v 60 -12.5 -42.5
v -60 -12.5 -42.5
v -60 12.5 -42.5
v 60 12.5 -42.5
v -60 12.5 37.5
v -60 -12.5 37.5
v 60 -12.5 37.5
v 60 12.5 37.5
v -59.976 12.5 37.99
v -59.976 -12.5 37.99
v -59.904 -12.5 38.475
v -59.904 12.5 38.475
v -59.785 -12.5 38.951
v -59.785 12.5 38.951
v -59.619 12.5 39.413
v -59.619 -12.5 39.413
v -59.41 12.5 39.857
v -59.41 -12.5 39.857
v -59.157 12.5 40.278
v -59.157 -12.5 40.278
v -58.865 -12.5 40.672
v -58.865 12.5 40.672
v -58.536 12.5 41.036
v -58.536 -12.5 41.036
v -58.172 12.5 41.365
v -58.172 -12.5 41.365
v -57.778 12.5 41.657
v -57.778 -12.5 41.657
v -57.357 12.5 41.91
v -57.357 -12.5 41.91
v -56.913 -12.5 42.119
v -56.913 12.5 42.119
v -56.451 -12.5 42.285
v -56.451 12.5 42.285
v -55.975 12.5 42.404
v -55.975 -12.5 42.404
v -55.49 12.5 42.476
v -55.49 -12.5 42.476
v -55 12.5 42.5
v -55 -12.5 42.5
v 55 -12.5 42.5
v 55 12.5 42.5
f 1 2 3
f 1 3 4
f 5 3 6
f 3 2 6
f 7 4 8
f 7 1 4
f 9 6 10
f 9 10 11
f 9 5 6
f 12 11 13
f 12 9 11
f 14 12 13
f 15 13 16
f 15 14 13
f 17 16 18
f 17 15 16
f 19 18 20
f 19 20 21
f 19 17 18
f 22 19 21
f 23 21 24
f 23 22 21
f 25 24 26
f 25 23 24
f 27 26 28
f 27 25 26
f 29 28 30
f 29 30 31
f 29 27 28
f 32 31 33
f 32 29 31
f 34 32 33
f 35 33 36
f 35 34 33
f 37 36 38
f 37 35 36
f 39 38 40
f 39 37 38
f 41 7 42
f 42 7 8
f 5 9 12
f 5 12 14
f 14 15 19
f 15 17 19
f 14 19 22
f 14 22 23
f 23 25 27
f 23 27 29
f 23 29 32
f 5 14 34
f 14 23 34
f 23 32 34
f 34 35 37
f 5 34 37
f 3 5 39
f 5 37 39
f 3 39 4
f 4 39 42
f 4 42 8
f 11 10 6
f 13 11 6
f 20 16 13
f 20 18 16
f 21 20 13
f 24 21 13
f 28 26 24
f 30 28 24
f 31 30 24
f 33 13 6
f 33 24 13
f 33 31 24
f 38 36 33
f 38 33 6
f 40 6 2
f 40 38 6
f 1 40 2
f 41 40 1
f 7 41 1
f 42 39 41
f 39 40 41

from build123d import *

# Parameters (mm, degrees)
F0_W     = 120
F0_H     = 85
F1_DEPTH = 12.5
F2_R     = 5
F3_SIZE  = 5


with BuildPart() as f1:
    # F0 (on Front) → F1 (new body, symmetric)
    with BuildSketch(Plane.XZ):
        Rectangle(F0_W, F0_H)
    extrude(amount=F1_DEPTH, both=True)

    # F2
    f2_edges = [f1.edges().sort_by_distance(p)[0] for p in [
        (-60, 0, 42.5),
    ]]
    fillet(f2_edges, radius=F2_R)

    # F3
    f3_edges = [f1.edges().sort_by_distance(p)[0] for p in [
        (60, 0, 42.5),
    ]]
    chamfer(f3_edges, length=F3_SIZE)


solid = f1.part
